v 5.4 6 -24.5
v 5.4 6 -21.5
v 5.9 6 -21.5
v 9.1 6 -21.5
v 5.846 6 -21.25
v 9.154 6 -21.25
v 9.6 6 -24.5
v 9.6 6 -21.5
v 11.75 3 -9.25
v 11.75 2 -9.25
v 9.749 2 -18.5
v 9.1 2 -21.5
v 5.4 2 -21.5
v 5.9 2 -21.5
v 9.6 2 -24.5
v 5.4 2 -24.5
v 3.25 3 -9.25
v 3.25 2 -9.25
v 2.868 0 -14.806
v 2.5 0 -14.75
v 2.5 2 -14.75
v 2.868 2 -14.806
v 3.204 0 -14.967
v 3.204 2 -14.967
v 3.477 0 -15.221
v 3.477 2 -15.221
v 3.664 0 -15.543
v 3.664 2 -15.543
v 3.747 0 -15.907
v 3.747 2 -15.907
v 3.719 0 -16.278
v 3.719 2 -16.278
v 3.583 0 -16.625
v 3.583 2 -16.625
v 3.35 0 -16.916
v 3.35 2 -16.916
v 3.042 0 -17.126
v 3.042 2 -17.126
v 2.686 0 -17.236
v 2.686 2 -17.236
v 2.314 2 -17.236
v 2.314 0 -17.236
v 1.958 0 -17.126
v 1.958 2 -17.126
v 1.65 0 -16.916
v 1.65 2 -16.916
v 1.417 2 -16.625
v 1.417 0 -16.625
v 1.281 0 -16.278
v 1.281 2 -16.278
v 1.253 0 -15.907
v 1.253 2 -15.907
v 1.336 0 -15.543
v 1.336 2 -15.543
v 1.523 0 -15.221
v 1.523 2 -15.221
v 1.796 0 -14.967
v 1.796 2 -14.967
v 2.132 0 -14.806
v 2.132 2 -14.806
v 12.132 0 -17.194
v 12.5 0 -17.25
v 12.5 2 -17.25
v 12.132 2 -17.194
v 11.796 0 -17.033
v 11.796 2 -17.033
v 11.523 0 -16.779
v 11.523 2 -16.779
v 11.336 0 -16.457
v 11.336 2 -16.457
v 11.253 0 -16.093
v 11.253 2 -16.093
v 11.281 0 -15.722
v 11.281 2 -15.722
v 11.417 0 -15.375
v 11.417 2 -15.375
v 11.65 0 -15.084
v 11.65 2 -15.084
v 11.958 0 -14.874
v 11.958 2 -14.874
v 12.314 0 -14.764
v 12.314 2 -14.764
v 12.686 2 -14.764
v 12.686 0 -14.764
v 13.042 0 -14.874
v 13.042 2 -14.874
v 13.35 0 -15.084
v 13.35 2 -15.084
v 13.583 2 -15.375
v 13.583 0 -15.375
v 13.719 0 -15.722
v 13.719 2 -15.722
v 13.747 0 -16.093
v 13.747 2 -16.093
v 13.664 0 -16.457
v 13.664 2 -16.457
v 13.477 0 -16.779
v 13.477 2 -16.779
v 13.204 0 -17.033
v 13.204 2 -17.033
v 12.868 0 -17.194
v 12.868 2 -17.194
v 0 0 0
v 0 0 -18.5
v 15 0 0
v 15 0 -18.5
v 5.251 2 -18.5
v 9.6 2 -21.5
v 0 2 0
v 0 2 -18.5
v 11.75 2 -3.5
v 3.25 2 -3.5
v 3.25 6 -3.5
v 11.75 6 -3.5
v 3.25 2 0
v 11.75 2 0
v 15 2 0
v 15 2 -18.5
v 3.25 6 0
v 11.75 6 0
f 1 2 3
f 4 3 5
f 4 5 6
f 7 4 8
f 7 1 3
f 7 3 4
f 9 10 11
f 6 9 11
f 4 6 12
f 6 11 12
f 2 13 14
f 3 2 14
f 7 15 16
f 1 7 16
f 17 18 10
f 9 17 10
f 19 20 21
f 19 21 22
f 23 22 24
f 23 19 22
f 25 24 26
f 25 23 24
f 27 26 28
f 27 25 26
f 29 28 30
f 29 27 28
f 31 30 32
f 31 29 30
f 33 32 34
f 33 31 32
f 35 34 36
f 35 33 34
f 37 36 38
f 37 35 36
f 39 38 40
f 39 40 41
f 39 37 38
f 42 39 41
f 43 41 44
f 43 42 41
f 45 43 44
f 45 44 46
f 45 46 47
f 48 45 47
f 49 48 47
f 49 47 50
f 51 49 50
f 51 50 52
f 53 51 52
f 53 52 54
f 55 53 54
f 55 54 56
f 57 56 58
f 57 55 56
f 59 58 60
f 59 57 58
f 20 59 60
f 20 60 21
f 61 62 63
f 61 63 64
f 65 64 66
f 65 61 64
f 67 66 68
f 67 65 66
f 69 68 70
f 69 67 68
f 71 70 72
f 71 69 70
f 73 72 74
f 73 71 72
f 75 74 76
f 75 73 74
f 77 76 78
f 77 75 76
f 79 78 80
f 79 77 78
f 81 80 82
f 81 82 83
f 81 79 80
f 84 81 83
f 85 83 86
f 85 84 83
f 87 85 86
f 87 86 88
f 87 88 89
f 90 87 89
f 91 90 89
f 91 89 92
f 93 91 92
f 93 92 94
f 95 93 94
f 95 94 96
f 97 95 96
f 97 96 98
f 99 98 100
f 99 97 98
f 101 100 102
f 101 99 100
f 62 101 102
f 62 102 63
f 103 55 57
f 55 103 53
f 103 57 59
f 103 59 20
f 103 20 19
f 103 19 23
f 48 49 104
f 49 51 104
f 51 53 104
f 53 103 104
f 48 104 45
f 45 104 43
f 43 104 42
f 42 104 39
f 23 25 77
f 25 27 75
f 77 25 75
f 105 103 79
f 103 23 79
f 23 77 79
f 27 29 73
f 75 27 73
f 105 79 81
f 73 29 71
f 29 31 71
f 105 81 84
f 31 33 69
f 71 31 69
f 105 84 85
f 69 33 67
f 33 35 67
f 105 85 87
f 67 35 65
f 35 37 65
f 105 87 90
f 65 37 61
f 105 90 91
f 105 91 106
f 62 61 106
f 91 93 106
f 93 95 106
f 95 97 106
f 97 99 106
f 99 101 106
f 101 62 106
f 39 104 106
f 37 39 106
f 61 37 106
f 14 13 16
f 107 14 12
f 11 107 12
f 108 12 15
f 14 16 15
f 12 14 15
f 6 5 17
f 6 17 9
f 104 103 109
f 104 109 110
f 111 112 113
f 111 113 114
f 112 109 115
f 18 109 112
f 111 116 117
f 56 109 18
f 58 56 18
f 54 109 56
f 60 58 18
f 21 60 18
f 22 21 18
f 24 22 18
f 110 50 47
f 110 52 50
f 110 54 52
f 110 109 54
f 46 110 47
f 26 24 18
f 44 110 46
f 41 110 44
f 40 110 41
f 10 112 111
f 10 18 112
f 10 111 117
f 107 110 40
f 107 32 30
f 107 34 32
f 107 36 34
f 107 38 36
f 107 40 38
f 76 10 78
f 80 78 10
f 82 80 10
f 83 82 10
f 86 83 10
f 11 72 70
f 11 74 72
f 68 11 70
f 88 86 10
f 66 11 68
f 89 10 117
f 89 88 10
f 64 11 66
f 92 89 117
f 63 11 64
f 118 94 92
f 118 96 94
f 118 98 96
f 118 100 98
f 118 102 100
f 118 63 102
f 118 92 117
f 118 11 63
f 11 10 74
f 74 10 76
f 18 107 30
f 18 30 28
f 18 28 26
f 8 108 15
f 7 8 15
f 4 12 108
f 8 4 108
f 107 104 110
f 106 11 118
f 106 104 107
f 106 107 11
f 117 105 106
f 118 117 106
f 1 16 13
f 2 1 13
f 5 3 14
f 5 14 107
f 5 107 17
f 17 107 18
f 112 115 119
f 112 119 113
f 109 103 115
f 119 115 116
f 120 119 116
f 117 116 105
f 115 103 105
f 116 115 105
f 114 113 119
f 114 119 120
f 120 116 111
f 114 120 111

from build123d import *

# Parameters (mm, degrees)
SKETCH1_W           = 15
SKETCH1_H           = 18.5
SKETCH1_R           = 1.25
BOSS_EXTRUDE1_DEPTH = 2
SKETCH2_W           = 8.5
SKETCH2_H           = 3.5
BOSS_EXTRUDE2_DEPTH = 4
CHAMFER1_SIZE       = 3
CHAMFER1_SIZE2      = 12


with BuildPart() as part:
    # Sketch1 → Boss-Extrude1 (new body)
    with BuildSketch(Plane(origin=(0, 0, 0), x_dir=(1, 0, 0), z_dir=(0, 1, 0))):
        with Locations((7.5, 9.25)):
            Rectangle(SKETCH1_W, SKETCH1_H)
        with Locations(Location((2.5, 16, 0), (0, 0, 270))):
            Circle(SKETCH1_R, mode=Mode.SUBTRACT)
        with Locations(Location((12.5, 16, 0), (0, 0, 90))):
            Circle(SKETCH1_R, mode=Mode.SUBTRACT)
    extrude(amount=BOSS_EXTRUDE1_DEPTH)

    # Sketch2 → Boss-Extrude2 (add)
    with BuildSketch(Plane(origin=(0, 2, 0), x_dir=(1, 0, 0), z_dir=(0, 1, 0))):
        with Locations((7.5, 1.75)):
            Rectangle(SKETCH2_W, SKETCH2_H)
        Polygon((3.25, 9.25), (11.75, 9.25), (9.1, 21.5), (9.6, 21.5), (9.6, 24.5), (5.4, 24.5), (5.4, 21.5), (5.9, 21.5), align=None)
    extrude(amount=BOSS_EXTRUDE2_DEPTH)

    # Chamfer1
    chamfer1_edges = [part.edges().sort_by_distance(p)[0] for p in [
        (7.5, 6, -9.25),
    ]]
    chamfer1_side = [part.faces().sort_by_distance(p)[0] for p in [
        (7.5, 4, -9.25),
    ]]
    chamfer(chamfer1_edges, length=CHAMFER1_SIZE, length2=CHAMFER1_SIZE2, reference=chamfer1_side[0])


solid = part.part
